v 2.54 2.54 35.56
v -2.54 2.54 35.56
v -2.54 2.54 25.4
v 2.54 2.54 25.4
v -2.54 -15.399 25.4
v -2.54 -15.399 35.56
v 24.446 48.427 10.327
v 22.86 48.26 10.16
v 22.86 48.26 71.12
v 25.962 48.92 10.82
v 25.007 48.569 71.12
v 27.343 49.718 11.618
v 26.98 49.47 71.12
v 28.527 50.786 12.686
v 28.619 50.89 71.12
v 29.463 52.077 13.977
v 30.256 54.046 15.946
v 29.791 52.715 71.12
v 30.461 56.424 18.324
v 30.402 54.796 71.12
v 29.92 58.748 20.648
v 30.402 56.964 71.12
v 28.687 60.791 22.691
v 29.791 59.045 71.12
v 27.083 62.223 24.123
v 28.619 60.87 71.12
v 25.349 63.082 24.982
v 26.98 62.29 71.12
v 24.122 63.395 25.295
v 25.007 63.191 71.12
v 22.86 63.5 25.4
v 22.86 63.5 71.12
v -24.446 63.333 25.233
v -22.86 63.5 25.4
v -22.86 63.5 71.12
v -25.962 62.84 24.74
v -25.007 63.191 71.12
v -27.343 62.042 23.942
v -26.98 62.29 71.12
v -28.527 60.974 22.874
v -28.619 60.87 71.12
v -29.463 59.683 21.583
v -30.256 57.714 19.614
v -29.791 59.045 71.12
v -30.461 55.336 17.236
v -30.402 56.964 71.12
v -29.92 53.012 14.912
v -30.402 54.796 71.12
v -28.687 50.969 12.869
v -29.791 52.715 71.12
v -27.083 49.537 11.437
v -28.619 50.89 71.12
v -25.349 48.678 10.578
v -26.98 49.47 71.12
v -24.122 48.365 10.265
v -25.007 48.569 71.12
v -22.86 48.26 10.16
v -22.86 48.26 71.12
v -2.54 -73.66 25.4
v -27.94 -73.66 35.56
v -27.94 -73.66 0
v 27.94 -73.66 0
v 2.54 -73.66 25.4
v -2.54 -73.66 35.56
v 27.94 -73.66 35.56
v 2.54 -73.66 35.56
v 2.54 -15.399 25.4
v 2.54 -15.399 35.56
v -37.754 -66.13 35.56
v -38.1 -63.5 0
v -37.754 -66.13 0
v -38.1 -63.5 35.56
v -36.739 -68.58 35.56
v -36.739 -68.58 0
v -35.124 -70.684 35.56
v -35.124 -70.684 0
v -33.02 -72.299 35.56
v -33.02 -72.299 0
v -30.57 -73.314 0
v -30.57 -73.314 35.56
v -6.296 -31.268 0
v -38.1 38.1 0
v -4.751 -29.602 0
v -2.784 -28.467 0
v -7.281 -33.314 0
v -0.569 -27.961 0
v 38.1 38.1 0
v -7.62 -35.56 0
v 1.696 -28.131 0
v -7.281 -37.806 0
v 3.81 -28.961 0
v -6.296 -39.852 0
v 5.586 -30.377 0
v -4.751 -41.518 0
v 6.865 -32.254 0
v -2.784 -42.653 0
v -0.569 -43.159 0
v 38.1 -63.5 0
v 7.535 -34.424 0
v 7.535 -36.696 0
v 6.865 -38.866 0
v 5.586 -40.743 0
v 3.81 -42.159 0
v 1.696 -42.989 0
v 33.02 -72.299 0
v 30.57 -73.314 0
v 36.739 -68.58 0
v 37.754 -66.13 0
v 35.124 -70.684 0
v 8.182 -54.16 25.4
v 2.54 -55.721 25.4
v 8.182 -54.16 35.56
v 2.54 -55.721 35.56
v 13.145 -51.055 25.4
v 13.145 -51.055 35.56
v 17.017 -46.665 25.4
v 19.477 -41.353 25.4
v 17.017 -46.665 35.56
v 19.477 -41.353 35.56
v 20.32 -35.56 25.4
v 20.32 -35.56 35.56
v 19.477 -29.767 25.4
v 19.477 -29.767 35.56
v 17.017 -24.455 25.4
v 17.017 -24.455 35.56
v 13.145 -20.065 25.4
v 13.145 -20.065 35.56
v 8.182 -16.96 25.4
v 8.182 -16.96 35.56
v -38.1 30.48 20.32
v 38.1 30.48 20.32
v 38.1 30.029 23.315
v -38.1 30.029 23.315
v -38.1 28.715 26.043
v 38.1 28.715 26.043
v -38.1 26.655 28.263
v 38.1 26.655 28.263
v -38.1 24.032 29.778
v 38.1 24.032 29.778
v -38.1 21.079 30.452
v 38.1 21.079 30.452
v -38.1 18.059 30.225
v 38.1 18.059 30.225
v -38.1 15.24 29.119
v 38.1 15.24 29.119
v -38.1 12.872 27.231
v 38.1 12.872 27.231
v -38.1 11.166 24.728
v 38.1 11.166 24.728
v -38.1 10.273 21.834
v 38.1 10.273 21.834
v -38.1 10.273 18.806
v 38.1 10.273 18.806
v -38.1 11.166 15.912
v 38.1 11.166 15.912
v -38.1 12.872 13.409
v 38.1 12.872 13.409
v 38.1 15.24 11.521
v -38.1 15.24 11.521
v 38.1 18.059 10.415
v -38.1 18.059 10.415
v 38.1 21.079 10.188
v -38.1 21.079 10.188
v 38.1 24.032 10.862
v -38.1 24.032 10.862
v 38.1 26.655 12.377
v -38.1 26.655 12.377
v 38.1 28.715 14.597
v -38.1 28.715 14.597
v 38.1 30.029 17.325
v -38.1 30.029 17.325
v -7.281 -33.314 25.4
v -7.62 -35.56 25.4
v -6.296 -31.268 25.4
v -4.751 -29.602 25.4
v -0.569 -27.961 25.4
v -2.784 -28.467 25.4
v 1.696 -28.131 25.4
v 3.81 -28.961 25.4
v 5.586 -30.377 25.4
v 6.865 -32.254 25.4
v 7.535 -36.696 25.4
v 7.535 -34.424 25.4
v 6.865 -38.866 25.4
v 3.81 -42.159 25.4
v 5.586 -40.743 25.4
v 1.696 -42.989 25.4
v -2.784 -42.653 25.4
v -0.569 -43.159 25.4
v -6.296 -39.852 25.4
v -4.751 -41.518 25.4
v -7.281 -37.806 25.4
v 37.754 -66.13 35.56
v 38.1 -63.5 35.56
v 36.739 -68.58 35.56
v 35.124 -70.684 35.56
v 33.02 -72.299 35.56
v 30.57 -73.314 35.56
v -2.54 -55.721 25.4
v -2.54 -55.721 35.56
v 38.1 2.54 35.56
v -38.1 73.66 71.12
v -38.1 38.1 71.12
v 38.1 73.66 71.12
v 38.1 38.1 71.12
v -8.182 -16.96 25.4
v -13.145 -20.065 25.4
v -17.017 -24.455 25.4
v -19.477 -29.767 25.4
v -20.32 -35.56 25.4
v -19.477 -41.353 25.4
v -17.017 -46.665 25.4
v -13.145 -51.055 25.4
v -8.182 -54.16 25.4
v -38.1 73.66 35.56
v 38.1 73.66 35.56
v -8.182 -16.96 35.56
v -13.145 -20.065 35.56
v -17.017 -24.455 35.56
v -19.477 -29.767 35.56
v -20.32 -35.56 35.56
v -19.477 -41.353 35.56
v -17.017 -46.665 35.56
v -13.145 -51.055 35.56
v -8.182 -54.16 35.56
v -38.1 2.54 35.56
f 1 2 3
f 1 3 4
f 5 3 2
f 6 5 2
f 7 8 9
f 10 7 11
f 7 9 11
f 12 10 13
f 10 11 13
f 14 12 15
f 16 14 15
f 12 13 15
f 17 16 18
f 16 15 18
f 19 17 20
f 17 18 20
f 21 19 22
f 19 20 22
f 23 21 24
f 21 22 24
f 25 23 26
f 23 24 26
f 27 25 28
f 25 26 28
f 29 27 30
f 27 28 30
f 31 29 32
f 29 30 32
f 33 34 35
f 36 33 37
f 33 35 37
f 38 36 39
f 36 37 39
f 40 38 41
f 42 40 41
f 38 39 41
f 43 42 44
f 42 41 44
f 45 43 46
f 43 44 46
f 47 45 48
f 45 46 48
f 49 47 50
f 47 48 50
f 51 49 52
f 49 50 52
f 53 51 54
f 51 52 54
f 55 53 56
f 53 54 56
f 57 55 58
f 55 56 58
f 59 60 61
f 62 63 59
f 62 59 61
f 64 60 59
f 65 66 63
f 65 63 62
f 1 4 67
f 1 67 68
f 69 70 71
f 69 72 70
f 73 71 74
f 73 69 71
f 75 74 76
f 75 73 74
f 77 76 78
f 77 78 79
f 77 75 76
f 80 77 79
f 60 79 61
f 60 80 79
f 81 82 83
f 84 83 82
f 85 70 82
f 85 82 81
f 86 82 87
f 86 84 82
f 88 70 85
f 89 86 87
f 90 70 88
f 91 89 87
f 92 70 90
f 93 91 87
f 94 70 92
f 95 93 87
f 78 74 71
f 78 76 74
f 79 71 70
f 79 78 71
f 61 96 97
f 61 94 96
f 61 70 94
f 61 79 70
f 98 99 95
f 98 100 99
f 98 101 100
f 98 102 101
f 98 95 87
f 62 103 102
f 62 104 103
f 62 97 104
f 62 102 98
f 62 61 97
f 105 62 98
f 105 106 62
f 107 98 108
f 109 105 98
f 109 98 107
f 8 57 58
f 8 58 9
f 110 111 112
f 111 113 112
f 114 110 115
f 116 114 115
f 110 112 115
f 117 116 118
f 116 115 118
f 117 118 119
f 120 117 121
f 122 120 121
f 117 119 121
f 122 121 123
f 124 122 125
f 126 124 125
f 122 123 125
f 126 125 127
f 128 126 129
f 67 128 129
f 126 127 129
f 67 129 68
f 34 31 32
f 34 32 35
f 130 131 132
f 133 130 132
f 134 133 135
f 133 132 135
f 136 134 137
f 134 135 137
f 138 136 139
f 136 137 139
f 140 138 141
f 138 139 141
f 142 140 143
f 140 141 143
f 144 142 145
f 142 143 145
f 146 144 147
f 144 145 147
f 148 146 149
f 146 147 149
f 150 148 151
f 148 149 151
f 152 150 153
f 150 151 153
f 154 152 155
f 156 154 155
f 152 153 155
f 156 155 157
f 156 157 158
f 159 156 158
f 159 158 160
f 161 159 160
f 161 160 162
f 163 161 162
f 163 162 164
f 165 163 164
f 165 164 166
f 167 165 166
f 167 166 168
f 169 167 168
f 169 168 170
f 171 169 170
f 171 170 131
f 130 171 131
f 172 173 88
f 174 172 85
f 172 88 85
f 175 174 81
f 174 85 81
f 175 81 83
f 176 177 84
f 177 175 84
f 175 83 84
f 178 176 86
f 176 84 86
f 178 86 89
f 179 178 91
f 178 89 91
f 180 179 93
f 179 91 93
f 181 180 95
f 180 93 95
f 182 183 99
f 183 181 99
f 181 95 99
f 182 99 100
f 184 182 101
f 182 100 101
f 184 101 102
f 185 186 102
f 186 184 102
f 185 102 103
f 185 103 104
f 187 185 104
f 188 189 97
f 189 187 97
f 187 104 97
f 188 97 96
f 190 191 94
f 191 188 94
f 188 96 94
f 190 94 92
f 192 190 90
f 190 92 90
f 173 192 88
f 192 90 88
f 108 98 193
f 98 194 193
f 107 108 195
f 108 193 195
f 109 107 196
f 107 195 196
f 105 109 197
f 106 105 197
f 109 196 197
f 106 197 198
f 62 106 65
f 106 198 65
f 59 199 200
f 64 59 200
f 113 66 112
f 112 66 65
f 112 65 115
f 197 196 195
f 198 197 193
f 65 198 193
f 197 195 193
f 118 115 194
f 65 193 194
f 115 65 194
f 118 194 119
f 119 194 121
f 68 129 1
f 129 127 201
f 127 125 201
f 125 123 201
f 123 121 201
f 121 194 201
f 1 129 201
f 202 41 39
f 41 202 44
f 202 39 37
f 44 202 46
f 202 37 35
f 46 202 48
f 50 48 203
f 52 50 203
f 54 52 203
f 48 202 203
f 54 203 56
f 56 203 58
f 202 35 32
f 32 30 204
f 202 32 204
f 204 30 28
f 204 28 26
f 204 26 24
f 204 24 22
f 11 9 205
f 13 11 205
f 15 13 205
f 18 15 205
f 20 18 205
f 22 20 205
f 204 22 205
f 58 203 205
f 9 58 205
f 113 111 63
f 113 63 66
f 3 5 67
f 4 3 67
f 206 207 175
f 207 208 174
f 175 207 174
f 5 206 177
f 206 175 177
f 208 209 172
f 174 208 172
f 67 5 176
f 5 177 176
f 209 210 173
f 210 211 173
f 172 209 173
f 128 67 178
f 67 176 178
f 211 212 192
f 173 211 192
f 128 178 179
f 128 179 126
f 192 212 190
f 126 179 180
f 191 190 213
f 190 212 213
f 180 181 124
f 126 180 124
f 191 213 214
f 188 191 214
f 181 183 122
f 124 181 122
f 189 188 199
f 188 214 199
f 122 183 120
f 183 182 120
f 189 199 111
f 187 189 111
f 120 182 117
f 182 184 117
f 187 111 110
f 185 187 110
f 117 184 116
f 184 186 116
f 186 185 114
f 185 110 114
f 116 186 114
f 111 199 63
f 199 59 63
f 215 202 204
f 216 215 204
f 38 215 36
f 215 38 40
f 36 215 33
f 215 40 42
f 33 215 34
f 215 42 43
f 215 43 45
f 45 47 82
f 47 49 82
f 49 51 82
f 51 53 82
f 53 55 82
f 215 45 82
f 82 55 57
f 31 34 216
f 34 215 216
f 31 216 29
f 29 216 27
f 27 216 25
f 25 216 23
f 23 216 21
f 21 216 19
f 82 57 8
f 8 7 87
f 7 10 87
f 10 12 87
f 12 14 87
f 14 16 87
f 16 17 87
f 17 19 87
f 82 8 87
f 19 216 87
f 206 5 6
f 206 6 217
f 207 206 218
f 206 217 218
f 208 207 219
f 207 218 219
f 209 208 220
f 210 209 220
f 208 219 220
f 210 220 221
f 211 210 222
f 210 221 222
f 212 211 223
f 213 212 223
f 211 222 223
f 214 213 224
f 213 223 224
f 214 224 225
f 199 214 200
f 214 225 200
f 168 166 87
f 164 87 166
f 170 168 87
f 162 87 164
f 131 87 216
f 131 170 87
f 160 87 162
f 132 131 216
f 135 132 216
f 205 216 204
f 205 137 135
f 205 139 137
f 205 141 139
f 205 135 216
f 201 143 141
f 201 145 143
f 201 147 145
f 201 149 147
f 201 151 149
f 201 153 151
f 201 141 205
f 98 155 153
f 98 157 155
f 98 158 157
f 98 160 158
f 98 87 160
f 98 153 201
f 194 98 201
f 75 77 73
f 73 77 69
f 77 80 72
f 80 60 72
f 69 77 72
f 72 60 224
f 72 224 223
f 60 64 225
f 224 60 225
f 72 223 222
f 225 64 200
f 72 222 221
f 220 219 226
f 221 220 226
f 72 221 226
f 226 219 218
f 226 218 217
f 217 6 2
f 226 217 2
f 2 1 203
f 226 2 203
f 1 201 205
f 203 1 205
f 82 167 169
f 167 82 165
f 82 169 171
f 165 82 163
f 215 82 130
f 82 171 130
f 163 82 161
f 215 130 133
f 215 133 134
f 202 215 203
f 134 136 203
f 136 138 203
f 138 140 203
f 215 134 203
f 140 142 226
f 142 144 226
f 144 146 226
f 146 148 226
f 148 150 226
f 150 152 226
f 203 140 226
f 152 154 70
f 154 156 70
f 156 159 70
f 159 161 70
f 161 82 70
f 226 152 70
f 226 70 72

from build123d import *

# Parameters (mm, degrees)
F0_W           = 76.2
F0_H           = 71.12
F1_DEPTH       = 73.66
F3_DEPTH       = 76.201
F4_R           = 10.16
F5_DEPTH       = 76.201
F7_DEPTH       = 71.121
F9_D           = 15.24
F9_CBORE_D     = 40.64
F9_CBORE_DEPTH = 10.16
F10_W          = 5.08
F10_H          = 10.16
F11_DEPTH      = 76.2
F12_R          = 10.16


with BuildPart() as f1:
    # F0 (on Front) → F1 (new body, symmetric)
    with BuildSketch(Plane.XZ):
        with Locations((0, 35.56)):
            Rectangle(F0_W, F0_H)
    extrude(amount=F1_DEPTH, both=True)

    # F2 (on face) → F3 (cut, through all)
    with BuildSketch(Plane.YZ.offset(38.1)):
        Polygon((38.1, 71.12), (-73.66, 71.12), (-73.66, 35.56), (2.54, 35.56), align=None)
        Polygon((38.1, 0), (73.66, 0), (73.66, 35.56), align=None)
    extrude(amount=-F3_DEPTH, mode=Mode.SUBTRACT)

    # F4 (on face) → F5 (cut, through all)
    with BuildSketch(Plane.YZ.offset(38.1)):
        with Locations((20.32, 20.32)):
            Circle(F4_R)
    extrude(amount=-F5_DEPTH, mode=Mode.SUBTRACT)

    # F6 (on face) → F7 (cut, through all)
    with BuildSketch(Plane.XY.offset(71.12)):
        with BuildLine():
            Line((22.86, 63.5), (-22.86, 63.5))
            ThreePointArc((-22.86, 63.5), (-30.48, 55.88), (-22.86, 48.26))
            Line((-22.86, 48.26), (22.86, 48.26))
            ThreePointArc((22.86, 48.26), (30.48, 55.88), (22.86, 63.5))
        make_face()
    extrude(amount=-F7_DEPTH, mode=Mode.SUBTRACT)

    # F9 (through all)
    with Locations(Plane.XY.offset(35.56)):
        with Locations((0, -35.56)):
            CounterBoreHole(F9_D / 2, F9_CBORE_D / 2, F9_CBORE_DEPTH)

    # F10 (on face) → F11 (cut)
    with BuildSketch(Plane.XZ.offset(73.66)):
        with Locations((0, 30.48)):
            Rectangle(F10_W, F10_H)
    extrude(amount=-F11_DEPTH, mode=Mode.SUBTRACT)

    # F12
    f12_edges = [f1.edges().sort_by_distance(p)[0] for p in [
        (38.1, -73.66, 17.78),
        (-38.1, -73.66, 17.78),
    ]]
    fillet(f12_edges, radius=F12_R)


solid = f1.part
